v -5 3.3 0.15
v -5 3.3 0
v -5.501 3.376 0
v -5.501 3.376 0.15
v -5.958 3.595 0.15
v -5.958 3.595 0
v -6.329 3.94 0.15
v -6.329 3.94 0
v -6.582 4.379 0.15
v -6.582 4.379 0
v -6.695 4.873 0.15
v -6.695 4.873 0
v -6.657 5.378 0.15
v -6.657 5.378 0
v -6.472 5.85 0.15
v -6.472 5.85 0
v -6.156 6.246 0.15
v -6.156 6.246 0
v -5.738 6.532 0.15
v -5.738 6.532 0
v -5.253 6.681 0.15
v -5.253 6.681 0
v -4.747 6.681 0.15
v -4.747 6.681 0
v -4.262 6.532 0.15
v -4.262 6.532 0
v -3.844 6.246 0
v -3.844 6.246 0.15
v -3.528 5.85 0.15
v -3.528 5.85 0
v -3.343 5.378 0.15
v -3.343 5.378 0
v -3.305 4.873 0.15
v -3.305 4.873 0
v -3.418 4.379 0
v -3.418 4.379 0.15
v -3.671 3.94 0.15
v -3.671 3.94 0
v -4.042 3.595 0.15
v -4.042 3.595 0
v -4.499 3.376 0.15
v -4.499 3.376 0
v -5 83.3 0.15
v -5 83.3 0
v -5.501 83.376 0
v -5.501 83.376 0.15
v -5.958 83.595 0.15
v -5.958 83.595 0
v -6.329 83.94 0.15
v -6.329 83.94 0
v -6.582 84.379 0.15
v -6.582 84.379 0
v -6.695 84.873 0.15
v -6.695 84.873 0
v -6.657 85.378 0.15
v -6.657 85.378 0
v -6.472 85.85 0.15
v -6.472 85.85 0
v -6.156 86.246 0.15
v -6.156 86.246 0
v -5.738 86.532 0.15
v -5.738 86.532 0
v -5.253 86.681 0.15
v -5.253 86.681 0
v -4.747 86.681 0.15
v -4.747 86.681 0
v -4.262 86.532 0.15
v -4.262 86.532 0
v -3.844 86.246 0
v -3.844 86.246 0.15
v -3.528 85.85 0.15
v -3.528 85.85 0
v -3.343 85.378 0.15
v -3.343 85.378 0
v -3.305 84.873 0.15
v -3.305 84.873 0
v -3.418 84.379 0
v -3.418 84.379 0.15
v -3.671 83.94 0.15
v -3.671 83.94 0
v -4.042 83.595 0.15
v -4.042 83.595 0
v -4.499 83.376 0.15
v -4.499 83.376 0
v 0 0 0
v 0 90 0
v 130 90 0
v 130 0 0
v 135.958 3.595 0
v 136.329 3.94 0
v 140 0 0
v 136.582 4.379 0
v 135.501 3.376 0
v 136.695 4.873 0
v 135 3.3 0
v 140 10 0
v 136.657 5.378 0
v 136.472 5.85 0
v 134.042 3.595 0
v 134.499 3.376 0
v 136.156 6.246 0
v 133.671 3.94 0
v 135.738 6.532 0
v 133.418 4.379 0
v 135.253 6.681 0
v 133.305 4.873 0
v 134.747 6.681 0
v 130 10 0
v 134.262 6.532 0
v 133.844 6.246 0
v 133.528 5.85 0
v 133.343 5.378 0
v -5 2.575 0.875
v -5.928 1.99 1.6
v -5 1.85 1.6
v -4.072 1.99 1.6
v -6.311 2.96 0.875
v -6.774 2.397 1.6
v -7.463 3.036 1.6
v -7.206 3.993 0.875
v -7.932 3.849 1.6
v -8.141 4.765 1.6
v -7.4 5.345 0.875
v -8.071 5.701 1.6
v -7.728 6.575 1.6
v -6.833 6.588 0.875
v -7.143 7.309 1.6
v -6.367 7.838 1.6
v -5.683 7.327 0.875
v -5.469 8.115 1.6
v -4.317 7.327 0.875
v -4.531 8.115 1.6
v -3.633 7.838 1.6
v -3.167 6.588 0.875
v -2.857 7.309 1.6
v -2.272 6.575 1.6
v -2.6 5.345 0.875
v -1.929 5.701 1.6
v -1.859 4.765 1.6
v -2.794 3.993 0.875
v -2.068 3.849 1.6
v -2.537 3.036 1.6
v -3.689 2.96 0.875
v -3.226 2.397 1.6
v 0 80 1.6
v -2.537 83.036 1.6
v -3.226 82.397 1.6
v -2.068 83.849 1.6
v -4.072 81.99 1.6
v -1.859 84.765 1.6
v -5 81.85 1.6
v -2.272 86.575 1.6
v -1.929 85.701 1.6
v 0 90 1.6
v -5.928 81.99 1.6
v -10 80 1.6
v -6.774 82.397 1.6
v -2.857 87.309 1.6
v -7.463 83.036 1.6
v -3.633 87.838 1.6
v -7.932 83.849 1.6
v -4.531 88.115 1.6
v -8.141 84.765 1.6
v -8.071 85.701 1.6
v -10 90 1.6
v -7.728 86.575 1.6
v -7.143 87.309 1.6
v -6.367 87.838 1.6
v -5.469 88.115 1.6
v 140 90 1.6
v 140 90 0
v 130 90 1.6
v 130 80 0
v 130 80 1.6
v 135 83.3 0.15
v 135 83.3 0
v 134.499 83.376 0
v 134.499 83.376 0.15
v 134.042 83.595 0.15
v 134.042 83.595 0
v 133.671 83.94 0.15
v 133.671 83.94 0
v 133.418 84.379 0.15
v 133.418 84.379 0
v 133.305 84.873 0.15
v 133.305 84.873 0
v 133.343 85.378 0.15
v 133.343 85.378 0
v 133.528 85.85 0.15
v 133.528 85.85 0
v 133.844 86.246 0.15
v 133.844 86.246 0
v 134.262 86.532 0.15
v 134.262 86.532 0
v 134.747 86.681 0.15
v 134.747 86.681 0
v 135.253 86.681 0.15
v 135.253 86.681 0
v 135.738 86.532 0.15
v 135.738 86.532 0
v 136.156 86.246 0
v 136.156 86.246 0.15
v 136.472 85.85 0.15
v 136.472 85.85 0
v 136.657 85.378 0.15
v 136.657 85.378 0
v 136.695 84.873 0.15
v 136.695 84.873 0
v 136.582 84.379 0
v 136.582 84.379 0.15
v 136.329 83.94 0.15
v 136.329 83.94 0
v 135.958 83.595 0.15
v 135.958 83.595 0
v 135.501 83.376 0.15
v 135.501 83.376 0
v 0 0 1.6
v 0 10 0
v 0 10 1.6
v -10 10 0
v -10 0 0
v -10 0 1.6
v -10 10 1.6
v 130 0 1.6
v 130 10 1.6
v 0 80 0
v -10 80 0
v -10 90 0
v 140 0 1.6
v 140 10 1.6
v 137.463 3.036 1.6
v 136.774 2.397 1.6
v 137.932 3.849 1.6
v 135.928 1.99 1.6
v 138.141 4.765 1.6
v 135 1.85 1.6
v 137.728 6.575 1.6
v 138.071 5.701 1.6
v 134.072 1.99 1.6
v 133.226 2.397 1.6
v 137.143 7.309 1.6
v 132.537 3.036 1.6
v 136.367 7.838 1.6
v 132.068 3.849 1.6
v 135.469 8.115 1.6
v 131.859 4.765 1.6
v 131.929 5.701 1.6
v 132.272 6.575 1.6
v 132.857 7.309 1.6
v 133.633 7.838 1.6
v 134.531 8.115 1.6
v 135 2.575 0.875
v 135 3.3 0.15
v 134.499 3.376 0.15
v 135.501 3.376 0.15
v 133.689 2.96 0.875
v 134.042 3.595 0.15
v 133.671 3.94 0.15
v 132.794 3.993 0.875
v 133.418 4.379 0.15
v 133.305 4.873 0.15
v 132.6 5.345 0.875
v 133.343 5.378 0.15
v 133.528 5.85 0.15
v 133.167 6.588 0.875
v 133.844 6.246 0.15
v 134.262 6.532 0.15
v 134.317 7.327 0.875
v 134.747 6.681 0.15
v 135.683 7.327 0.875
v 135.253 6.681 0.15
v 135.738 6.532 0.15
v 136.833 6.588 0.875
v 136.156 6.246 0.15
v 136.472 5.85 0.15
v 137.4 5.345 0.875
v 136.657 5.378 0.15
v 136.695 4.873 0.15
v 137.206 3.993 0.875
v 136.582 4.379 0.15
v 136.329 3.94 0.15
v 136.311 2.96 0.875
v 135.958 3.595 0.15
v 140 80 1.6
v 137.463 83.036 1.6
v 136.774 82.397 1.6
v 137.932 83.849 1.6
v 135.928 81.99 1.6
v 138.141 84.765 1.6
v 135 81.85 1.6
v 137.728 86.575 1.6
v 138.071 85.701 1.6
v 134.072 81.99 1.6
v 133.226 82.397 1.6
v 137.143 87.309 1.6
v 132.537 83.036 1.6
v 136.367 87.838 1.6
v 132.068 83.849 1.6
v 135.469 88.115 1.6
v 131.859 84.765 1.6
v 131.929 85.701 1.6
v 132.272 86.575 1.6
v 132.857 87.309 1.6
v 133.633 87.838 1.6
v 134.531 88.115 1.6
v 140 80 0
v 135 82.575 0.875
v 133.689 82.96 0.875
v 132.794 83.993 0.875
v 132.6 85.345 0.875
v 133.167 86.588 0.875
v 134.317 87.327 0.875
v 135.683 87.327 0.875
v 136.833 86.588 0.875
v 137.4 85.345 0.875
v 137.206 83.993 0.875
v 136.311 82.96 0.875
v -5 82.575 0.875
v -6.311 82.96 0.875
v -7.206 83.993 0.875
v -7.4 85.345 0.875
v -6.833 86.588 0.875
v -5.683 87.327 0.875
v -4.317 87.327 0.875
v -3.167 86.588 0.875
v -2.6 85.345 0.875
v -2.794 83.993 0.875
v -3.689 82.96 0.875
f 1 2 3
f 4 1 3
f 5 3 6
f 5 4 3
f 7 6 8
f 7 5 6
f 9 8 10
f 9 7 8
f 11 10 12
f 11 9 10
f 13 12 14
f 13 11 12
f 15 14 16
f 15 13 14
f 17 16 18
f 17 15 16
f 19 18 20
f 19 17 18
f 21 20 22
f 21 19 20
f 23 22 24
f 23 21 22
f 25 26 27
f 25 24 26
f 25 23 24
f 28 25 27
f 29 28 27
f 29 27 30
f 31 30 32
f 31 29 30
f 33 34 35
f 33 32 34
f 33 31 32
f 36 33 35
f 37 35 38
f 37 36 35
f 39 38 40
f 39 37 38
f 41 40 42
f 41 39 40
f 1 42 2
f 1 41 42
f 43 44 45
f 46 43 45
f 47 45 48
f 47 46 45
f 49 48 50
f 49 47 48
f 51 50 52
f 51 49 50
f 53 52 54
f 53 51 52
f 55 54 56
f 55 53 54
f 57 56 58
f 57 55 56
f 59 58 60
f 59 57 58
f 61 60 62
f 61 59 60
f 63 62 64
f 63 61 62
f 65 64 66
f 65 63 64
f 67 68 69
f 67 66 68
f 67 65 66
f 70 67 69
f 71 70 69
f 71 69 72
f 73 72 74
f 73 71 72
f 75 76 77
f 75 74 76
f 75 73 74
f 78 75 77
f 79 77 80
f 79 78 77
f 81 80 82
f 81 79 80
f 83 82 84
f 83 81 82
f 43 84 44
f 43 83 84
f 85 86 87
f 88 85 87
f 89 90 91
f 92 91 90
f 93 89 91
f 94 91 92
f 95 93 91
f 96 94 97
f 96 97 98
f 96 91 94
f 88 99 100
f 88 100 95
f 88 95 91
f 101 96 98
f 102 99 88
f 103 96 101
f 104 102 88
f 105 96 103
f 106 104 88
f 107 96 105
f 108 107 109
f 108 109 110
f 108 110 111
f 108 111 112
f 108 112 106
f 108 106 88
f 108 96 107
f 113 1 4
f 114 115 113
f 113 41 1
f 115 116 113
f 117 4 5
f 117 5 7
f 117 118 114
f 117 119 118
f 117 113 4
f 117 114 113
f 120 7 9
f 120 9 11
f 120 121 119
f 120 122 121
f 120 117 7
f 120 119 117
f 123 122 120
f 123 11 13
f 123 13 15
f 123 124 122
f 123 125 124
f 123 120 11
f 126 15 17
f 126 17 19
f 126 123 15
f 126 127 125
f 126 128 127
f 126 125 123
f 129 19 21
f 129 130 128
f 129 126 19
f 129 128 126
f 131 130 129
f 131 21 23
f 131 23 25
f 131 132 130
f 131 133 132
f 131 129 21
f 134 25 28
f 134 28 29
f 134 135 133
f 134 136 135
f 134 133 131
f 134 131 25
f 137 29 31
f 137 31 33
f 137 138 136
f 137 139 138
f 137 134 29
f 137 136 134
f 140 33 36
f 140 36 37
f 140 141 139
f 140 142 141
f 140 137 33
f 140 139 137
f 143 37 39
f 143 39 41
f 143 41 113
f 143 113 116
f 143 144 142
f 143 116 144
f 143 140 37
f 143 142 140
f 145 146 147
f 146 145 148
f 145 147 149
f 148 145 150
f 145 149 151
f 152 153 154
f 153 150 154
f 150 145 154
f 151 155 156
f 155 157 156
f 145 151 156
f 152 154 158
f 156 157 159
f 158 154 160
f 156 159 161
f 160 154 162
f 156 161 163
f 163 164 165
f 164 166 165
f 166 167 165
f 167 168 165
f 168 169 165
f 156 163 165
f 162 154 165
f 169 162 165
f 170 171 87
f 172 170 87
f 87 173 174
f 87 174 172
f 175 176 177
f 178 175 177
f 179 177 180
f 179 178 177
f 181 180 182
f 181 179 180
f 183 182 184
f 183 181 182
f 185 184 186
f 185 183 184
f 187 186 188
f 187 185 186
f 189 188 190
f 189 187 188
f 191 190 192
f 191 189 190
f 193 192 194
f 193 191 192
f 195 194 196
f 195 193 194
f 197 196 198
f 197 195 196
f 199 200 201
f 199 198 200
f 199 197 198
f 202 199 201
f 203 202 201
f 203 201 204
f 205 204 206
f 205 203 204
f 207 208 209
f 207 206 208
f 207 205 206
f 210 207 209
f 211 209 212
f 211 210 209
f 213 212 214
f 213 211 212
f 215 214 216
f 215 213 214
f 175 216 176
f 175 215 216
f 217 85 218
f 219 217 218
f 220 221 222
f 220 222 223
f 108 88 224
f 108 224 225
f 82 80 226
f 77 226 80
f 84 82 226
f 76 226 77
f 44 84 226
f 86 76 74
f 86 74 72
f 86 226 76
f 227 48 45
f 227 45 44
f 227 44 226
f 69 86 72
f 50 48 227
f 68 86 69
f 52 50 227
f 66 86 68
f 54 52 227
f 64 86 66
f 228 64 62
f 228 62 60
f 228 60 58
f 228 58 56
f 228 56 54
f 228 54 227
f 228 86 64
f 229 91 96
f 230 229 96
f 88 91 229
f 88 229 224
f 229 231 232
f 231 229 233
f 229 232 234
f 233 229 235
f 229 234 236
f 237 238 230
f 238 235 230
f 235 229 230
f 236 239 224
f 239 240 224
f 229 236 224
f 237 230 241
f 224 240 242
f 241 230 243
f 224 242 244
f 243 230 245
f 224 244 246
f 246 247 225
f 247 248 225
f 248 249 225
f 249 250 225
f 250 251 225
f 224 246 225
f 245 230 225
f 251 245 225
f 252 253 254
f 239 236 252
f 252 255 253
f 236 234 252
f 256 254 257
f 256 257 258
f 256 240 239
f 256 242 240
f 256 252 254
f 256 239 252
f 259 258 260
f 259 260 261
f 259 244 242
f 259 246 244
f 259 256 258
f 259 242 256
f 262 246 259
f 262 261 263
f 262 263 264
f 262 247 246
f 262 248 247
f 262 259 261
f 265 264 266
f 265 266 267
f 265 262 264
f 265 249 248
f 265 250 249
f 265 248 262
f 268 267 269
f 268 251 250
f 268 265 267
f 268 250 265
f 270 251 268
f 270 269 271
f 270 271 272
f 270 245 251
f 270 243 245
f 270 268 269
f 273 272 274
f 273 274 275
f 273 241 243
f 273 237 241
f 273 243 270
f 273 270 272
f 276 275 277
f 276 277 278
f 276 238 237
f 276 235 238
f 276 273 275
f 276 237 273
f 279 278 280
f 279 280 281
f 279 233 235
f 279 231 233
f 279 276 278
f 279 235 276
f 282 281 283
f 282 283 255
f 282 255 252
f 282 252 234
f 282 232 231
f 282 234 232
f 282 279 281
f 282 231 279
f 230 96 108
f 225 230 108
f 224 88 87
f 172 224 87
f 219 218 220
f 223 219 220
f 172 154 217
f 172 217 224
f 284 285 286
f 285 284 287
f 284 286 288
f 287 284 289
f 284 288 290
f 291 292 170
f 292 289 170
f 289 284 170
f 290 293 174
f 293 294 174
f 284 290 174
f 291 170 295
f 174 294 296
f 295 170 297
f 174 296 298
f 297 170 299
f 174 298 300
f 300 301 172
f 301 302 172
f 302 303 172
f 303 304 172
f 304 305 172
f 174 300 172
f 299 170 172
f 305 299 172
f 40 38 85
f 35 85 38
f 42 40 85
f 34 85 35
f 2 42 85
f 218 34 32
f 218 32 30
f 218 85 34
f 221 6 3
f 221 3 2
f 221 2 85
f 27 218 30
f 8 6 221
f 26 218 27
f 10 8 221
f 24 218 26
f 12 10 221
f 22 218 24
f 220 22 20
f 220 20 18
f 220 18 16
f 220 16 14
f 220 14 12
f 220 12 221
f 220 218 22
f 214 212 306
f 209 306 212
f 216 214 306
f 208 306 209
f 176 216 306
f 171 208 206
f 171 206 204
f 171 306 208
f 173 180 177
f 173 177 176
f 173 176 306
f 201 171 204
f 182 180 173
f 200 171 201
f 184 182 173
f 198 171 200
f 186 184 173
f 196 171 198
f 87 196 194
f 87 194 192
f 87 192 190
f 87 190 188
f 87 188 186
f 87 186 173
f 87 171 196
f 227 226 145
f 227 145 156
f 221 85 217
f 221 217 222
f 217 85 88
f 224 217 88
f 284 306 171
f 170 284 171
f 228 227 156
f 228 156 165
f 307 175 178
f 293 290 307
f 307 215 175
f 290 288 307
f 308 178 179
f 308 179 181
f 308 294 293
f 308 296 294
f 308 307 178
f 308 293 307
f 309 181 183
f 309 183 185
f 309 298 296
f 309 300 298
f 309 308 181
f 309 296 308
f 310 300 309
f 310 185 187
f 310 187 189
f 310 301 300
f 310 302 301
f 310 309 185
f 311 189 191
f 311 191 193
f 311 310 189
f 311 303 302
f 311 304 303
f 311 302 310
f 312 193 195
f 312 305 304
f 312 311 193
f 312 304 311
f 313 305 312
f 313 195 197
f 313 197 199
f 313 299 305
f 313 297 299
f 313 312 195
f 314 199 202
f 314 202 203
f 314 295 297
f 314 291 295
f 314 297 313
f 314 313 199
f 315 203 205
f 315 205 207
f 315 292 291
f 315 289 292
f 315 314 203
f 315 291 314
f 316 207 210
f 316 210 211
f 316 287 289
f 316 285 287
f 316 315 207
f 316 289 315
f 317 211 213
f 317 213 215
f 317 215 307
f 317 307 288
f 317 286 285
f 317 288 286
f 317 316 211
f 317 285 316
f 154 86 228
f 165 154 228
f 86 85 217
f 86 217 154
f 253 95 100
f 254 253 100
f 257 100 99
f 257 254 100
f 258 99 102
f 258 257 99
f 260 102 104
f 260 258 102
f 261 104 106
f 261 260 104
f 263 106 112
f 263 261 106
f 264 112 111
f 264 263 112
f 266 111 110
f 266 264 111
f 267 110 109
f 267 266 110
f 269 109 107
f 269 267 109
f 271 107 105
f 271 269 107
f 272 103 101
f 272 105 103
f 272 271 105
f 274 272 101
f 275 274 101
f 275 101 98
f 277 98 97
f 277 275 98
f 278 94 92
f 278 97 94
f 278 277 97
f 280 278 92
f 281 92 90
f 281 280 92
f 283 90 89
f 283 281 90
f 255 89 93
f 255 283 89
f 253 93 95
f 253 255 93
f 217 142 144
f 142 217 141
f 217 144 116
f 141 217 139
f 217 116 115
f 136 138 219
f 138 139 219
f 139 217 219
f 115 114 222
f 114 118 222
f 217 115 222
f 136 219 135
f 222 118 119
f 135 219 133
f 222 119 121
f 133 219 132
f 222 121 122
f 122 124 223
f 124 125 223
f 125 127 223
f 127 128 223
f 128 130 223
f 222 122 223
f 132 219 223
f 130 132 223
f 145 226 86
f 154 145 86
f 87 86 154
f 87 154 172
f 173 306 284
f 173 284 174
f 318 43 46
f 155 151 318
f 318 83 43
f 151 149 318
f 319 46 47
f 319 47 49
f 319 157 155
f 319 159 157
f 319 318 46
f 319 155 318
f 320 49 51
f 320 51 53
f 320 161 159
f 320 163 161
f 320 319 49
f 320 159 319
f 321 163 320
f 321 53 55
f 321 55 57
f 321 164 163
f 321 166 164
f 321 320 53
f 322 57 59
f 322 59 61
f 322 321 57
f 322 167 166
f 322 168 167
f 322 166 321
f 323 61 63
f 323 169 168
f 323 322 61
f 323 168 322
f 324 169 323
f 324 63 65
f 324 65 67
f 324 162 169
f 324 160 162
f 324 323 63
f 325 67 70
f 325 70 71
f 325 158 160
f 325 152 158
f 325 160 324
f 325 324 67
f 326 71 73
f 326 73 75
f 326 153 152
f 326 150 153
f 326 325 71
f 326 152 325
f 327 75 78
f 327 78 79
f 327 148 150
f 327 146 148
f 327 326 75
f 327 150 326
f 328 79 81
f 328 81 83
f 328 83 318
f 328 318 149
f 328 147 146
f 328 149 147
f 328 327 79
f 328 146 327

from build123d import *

# Parameters (mm, degrees)
SKETCH1_W                                    = 130
SKETCH1_H                                    = 90
BOSS_EXTRUDE1_DEPTH                          = 1.6
SKETCH2_W                                    = 10
SKETCH2_H                                    = 10
BOSS_EXTRUDE2_DEPTH                          = 1.6
BOSS_EXTRUDE2_2_DEPTH                        = 1.6
BOSS_EXTRUDE2_3_DEPTH                        = 1.6
BOSS_EXTRUDE2_4_DEPTH                        = 1.6
CSK_FOR_M3_COUNTERSUNK_FLAT_HEAD_SCR_2_COUNT = 2
CSK_FOR_M3_COUNTERSUNK_FLAT_HEAD_SCR_2_PITCH = 140
CSK_FOR_M3_COUNTERSUNK_FLAT_HEAD_SCR_3_COUNT = 2
CSK_FOR_M3_COUNTERSUNK_FLAT_HEAD_SCR_3_PITCH = 161.245154966
CSK_FOR_M3_COUNTERSUNK_FLAT_HEAD_SCR_4_COUNT = 2
CSK_FOR_M3_COUNTERSUNK_FLAT_HEAD_SCR_4_PITCH = 80


with BuildPart() as part:
    # Sketch1 → Boss-Extrude1 (new body)
    with BuildSketch(Plane.XY):
        with Locations((65, 45)):
            Rectangle(SKETCH1_W, SKETCH1_H)
    extrude(amount=BOSS_EXTRUDE1_DEPTH)


with BuildPart() as body_2:
    # Sketch2 → Boss-Extrude2 (new body)
    with BuildSketch(Plane(origin=(0, 0, 0), x_dir=(-1, 0, 0), z_dir=(0, 0, -1))):
        with Locations((-135, 85)):
            Rectangle(SKETCH2_W, SKETCH2_H)
    extrude(amount=-BOSS_EXTRUDE2_DEPTH)


with BuildPart() as body_3:
    # Sketch2 → Boss-Extrude2 2 (new body)
    with BuildSketch(Plane(origin=(0, 0, 0), x_dir=(-1, 0, 0), z_dir=(0, 0, -1))):
        with Locations((-135, 5)):
            Rectangle(SKETCH2_W, SKETCH2_H)
    extrude(amount=-BOSS_EXTRUDE2_2_DEPTH)


with BuildPart() as body_4:
    # Sketch2 → Boss-Extrude2 3 (new body)
    with BuildSketch(Plane(origin=(0, 0, 0), x_dir=(-1, 0, 0), z_dir=(0, 0, -1))):
        with Locations((5, 5)):
            Rectangle(SKETCH2_W, SKETCH2_H)
    extrude(amount=-BOSS_EXTRUDE2_3_DEPTH)


with BuildPart() as body_5:
    # Sketch2 → Boss-Extrude2 4 (new body)
    with BuildSketch(Plane(origin=(0, 0, 0), x_dir=(-1, 0, 0), z_dir=(0, 0, -1))):
        with Locations((5, 85)):
            Rectangle(SKETCH2_W, SKETCH2_H)
    extrude(amount=-BOSS_EXTRUDE2_4_DEPTH)

    # Sketch5 → CSK for M3 Countersunk Flat Head Screw1 (revolve, cut)
    with BuildSketch(Plane(origin=(-5, 85, 1.6), x_dir=(0, -1, 0), z_dir=(1, 0, 0))):
        Polygon((0, 0), (0, 31.021463052), (1.7, 30), (1.7, 1.45), (3.15, 0), align=None)
    csk_for_m3_countersunk_flat_head_screw1 = revolve(axis=Axis((-5, 85, 7.95), (0, 0, -1)), mode=Mode.SUBTRACT)


with BuildPart() as body_2_1:
    add(body_2.part)

    # CSK for M3 Countersunk Flat Head Scr 2: CSK for M3 Countersunk Flat Head Screw1 ×2
    with Locations(*[(i * CSK_FOR_M3_COUNTERSUNK_FLAT_HEAD_SCR_2_PITCH, 0, 0) for i in range(1, CSK_FOR_M3_COUNTERSUNK_FLAT_HEAD_SCR_2_COUNT)]):
        add(csk_for_m3_countersunk_flat_head_screw1, mode=Mode.SUBTRACT)


with BuildPart() as body_3_1:
    add(body_3.part)

    # CSK for M3 Countersunk Flat Head Scr 3: CSK for M3 Countersunk Flat Head Screw1 ×2
    with Locations(*[Vector(0.8682431421244593, -0.49613893835683387, 0) * (i * CSK_FOR_M3_COUNTERSUNK_FLAT_HEAD_SCR_3_PITCH) for i in range(1, CSK_FOR_M3_COUNTERSUNK_FLAT_HEAD_SCR_3_COUNT)]):
        add(csk_for_m3_countersunk_flat_head_screw1, mode=Mode.SUBTRACT)


with BuildPart() as body_4_1:
    add(body_4.part)

    # CSK for M3 Countersunk Flat Head Scr 4: CSK for M3 Countersunk Flat Head Screw1 ×2
    with Locations(*[(0, -i * CSK_FOR_M3_COUNTERSUNK_FLAT_HEAD_SCR_4_PITCH, 0) for i in range(1, CSK_FOR_M3_COUNTERSUNK_FLAT_HEAD_SCR_4_COUNT)]):
        add(csk_for_m3_countersunk_flat_head_screw1, mode=Mode.SUBTRACT)


solid = Compound([part.part, body_5.part, body_2_1.part, body_3_1.part, body_4_1.part])
